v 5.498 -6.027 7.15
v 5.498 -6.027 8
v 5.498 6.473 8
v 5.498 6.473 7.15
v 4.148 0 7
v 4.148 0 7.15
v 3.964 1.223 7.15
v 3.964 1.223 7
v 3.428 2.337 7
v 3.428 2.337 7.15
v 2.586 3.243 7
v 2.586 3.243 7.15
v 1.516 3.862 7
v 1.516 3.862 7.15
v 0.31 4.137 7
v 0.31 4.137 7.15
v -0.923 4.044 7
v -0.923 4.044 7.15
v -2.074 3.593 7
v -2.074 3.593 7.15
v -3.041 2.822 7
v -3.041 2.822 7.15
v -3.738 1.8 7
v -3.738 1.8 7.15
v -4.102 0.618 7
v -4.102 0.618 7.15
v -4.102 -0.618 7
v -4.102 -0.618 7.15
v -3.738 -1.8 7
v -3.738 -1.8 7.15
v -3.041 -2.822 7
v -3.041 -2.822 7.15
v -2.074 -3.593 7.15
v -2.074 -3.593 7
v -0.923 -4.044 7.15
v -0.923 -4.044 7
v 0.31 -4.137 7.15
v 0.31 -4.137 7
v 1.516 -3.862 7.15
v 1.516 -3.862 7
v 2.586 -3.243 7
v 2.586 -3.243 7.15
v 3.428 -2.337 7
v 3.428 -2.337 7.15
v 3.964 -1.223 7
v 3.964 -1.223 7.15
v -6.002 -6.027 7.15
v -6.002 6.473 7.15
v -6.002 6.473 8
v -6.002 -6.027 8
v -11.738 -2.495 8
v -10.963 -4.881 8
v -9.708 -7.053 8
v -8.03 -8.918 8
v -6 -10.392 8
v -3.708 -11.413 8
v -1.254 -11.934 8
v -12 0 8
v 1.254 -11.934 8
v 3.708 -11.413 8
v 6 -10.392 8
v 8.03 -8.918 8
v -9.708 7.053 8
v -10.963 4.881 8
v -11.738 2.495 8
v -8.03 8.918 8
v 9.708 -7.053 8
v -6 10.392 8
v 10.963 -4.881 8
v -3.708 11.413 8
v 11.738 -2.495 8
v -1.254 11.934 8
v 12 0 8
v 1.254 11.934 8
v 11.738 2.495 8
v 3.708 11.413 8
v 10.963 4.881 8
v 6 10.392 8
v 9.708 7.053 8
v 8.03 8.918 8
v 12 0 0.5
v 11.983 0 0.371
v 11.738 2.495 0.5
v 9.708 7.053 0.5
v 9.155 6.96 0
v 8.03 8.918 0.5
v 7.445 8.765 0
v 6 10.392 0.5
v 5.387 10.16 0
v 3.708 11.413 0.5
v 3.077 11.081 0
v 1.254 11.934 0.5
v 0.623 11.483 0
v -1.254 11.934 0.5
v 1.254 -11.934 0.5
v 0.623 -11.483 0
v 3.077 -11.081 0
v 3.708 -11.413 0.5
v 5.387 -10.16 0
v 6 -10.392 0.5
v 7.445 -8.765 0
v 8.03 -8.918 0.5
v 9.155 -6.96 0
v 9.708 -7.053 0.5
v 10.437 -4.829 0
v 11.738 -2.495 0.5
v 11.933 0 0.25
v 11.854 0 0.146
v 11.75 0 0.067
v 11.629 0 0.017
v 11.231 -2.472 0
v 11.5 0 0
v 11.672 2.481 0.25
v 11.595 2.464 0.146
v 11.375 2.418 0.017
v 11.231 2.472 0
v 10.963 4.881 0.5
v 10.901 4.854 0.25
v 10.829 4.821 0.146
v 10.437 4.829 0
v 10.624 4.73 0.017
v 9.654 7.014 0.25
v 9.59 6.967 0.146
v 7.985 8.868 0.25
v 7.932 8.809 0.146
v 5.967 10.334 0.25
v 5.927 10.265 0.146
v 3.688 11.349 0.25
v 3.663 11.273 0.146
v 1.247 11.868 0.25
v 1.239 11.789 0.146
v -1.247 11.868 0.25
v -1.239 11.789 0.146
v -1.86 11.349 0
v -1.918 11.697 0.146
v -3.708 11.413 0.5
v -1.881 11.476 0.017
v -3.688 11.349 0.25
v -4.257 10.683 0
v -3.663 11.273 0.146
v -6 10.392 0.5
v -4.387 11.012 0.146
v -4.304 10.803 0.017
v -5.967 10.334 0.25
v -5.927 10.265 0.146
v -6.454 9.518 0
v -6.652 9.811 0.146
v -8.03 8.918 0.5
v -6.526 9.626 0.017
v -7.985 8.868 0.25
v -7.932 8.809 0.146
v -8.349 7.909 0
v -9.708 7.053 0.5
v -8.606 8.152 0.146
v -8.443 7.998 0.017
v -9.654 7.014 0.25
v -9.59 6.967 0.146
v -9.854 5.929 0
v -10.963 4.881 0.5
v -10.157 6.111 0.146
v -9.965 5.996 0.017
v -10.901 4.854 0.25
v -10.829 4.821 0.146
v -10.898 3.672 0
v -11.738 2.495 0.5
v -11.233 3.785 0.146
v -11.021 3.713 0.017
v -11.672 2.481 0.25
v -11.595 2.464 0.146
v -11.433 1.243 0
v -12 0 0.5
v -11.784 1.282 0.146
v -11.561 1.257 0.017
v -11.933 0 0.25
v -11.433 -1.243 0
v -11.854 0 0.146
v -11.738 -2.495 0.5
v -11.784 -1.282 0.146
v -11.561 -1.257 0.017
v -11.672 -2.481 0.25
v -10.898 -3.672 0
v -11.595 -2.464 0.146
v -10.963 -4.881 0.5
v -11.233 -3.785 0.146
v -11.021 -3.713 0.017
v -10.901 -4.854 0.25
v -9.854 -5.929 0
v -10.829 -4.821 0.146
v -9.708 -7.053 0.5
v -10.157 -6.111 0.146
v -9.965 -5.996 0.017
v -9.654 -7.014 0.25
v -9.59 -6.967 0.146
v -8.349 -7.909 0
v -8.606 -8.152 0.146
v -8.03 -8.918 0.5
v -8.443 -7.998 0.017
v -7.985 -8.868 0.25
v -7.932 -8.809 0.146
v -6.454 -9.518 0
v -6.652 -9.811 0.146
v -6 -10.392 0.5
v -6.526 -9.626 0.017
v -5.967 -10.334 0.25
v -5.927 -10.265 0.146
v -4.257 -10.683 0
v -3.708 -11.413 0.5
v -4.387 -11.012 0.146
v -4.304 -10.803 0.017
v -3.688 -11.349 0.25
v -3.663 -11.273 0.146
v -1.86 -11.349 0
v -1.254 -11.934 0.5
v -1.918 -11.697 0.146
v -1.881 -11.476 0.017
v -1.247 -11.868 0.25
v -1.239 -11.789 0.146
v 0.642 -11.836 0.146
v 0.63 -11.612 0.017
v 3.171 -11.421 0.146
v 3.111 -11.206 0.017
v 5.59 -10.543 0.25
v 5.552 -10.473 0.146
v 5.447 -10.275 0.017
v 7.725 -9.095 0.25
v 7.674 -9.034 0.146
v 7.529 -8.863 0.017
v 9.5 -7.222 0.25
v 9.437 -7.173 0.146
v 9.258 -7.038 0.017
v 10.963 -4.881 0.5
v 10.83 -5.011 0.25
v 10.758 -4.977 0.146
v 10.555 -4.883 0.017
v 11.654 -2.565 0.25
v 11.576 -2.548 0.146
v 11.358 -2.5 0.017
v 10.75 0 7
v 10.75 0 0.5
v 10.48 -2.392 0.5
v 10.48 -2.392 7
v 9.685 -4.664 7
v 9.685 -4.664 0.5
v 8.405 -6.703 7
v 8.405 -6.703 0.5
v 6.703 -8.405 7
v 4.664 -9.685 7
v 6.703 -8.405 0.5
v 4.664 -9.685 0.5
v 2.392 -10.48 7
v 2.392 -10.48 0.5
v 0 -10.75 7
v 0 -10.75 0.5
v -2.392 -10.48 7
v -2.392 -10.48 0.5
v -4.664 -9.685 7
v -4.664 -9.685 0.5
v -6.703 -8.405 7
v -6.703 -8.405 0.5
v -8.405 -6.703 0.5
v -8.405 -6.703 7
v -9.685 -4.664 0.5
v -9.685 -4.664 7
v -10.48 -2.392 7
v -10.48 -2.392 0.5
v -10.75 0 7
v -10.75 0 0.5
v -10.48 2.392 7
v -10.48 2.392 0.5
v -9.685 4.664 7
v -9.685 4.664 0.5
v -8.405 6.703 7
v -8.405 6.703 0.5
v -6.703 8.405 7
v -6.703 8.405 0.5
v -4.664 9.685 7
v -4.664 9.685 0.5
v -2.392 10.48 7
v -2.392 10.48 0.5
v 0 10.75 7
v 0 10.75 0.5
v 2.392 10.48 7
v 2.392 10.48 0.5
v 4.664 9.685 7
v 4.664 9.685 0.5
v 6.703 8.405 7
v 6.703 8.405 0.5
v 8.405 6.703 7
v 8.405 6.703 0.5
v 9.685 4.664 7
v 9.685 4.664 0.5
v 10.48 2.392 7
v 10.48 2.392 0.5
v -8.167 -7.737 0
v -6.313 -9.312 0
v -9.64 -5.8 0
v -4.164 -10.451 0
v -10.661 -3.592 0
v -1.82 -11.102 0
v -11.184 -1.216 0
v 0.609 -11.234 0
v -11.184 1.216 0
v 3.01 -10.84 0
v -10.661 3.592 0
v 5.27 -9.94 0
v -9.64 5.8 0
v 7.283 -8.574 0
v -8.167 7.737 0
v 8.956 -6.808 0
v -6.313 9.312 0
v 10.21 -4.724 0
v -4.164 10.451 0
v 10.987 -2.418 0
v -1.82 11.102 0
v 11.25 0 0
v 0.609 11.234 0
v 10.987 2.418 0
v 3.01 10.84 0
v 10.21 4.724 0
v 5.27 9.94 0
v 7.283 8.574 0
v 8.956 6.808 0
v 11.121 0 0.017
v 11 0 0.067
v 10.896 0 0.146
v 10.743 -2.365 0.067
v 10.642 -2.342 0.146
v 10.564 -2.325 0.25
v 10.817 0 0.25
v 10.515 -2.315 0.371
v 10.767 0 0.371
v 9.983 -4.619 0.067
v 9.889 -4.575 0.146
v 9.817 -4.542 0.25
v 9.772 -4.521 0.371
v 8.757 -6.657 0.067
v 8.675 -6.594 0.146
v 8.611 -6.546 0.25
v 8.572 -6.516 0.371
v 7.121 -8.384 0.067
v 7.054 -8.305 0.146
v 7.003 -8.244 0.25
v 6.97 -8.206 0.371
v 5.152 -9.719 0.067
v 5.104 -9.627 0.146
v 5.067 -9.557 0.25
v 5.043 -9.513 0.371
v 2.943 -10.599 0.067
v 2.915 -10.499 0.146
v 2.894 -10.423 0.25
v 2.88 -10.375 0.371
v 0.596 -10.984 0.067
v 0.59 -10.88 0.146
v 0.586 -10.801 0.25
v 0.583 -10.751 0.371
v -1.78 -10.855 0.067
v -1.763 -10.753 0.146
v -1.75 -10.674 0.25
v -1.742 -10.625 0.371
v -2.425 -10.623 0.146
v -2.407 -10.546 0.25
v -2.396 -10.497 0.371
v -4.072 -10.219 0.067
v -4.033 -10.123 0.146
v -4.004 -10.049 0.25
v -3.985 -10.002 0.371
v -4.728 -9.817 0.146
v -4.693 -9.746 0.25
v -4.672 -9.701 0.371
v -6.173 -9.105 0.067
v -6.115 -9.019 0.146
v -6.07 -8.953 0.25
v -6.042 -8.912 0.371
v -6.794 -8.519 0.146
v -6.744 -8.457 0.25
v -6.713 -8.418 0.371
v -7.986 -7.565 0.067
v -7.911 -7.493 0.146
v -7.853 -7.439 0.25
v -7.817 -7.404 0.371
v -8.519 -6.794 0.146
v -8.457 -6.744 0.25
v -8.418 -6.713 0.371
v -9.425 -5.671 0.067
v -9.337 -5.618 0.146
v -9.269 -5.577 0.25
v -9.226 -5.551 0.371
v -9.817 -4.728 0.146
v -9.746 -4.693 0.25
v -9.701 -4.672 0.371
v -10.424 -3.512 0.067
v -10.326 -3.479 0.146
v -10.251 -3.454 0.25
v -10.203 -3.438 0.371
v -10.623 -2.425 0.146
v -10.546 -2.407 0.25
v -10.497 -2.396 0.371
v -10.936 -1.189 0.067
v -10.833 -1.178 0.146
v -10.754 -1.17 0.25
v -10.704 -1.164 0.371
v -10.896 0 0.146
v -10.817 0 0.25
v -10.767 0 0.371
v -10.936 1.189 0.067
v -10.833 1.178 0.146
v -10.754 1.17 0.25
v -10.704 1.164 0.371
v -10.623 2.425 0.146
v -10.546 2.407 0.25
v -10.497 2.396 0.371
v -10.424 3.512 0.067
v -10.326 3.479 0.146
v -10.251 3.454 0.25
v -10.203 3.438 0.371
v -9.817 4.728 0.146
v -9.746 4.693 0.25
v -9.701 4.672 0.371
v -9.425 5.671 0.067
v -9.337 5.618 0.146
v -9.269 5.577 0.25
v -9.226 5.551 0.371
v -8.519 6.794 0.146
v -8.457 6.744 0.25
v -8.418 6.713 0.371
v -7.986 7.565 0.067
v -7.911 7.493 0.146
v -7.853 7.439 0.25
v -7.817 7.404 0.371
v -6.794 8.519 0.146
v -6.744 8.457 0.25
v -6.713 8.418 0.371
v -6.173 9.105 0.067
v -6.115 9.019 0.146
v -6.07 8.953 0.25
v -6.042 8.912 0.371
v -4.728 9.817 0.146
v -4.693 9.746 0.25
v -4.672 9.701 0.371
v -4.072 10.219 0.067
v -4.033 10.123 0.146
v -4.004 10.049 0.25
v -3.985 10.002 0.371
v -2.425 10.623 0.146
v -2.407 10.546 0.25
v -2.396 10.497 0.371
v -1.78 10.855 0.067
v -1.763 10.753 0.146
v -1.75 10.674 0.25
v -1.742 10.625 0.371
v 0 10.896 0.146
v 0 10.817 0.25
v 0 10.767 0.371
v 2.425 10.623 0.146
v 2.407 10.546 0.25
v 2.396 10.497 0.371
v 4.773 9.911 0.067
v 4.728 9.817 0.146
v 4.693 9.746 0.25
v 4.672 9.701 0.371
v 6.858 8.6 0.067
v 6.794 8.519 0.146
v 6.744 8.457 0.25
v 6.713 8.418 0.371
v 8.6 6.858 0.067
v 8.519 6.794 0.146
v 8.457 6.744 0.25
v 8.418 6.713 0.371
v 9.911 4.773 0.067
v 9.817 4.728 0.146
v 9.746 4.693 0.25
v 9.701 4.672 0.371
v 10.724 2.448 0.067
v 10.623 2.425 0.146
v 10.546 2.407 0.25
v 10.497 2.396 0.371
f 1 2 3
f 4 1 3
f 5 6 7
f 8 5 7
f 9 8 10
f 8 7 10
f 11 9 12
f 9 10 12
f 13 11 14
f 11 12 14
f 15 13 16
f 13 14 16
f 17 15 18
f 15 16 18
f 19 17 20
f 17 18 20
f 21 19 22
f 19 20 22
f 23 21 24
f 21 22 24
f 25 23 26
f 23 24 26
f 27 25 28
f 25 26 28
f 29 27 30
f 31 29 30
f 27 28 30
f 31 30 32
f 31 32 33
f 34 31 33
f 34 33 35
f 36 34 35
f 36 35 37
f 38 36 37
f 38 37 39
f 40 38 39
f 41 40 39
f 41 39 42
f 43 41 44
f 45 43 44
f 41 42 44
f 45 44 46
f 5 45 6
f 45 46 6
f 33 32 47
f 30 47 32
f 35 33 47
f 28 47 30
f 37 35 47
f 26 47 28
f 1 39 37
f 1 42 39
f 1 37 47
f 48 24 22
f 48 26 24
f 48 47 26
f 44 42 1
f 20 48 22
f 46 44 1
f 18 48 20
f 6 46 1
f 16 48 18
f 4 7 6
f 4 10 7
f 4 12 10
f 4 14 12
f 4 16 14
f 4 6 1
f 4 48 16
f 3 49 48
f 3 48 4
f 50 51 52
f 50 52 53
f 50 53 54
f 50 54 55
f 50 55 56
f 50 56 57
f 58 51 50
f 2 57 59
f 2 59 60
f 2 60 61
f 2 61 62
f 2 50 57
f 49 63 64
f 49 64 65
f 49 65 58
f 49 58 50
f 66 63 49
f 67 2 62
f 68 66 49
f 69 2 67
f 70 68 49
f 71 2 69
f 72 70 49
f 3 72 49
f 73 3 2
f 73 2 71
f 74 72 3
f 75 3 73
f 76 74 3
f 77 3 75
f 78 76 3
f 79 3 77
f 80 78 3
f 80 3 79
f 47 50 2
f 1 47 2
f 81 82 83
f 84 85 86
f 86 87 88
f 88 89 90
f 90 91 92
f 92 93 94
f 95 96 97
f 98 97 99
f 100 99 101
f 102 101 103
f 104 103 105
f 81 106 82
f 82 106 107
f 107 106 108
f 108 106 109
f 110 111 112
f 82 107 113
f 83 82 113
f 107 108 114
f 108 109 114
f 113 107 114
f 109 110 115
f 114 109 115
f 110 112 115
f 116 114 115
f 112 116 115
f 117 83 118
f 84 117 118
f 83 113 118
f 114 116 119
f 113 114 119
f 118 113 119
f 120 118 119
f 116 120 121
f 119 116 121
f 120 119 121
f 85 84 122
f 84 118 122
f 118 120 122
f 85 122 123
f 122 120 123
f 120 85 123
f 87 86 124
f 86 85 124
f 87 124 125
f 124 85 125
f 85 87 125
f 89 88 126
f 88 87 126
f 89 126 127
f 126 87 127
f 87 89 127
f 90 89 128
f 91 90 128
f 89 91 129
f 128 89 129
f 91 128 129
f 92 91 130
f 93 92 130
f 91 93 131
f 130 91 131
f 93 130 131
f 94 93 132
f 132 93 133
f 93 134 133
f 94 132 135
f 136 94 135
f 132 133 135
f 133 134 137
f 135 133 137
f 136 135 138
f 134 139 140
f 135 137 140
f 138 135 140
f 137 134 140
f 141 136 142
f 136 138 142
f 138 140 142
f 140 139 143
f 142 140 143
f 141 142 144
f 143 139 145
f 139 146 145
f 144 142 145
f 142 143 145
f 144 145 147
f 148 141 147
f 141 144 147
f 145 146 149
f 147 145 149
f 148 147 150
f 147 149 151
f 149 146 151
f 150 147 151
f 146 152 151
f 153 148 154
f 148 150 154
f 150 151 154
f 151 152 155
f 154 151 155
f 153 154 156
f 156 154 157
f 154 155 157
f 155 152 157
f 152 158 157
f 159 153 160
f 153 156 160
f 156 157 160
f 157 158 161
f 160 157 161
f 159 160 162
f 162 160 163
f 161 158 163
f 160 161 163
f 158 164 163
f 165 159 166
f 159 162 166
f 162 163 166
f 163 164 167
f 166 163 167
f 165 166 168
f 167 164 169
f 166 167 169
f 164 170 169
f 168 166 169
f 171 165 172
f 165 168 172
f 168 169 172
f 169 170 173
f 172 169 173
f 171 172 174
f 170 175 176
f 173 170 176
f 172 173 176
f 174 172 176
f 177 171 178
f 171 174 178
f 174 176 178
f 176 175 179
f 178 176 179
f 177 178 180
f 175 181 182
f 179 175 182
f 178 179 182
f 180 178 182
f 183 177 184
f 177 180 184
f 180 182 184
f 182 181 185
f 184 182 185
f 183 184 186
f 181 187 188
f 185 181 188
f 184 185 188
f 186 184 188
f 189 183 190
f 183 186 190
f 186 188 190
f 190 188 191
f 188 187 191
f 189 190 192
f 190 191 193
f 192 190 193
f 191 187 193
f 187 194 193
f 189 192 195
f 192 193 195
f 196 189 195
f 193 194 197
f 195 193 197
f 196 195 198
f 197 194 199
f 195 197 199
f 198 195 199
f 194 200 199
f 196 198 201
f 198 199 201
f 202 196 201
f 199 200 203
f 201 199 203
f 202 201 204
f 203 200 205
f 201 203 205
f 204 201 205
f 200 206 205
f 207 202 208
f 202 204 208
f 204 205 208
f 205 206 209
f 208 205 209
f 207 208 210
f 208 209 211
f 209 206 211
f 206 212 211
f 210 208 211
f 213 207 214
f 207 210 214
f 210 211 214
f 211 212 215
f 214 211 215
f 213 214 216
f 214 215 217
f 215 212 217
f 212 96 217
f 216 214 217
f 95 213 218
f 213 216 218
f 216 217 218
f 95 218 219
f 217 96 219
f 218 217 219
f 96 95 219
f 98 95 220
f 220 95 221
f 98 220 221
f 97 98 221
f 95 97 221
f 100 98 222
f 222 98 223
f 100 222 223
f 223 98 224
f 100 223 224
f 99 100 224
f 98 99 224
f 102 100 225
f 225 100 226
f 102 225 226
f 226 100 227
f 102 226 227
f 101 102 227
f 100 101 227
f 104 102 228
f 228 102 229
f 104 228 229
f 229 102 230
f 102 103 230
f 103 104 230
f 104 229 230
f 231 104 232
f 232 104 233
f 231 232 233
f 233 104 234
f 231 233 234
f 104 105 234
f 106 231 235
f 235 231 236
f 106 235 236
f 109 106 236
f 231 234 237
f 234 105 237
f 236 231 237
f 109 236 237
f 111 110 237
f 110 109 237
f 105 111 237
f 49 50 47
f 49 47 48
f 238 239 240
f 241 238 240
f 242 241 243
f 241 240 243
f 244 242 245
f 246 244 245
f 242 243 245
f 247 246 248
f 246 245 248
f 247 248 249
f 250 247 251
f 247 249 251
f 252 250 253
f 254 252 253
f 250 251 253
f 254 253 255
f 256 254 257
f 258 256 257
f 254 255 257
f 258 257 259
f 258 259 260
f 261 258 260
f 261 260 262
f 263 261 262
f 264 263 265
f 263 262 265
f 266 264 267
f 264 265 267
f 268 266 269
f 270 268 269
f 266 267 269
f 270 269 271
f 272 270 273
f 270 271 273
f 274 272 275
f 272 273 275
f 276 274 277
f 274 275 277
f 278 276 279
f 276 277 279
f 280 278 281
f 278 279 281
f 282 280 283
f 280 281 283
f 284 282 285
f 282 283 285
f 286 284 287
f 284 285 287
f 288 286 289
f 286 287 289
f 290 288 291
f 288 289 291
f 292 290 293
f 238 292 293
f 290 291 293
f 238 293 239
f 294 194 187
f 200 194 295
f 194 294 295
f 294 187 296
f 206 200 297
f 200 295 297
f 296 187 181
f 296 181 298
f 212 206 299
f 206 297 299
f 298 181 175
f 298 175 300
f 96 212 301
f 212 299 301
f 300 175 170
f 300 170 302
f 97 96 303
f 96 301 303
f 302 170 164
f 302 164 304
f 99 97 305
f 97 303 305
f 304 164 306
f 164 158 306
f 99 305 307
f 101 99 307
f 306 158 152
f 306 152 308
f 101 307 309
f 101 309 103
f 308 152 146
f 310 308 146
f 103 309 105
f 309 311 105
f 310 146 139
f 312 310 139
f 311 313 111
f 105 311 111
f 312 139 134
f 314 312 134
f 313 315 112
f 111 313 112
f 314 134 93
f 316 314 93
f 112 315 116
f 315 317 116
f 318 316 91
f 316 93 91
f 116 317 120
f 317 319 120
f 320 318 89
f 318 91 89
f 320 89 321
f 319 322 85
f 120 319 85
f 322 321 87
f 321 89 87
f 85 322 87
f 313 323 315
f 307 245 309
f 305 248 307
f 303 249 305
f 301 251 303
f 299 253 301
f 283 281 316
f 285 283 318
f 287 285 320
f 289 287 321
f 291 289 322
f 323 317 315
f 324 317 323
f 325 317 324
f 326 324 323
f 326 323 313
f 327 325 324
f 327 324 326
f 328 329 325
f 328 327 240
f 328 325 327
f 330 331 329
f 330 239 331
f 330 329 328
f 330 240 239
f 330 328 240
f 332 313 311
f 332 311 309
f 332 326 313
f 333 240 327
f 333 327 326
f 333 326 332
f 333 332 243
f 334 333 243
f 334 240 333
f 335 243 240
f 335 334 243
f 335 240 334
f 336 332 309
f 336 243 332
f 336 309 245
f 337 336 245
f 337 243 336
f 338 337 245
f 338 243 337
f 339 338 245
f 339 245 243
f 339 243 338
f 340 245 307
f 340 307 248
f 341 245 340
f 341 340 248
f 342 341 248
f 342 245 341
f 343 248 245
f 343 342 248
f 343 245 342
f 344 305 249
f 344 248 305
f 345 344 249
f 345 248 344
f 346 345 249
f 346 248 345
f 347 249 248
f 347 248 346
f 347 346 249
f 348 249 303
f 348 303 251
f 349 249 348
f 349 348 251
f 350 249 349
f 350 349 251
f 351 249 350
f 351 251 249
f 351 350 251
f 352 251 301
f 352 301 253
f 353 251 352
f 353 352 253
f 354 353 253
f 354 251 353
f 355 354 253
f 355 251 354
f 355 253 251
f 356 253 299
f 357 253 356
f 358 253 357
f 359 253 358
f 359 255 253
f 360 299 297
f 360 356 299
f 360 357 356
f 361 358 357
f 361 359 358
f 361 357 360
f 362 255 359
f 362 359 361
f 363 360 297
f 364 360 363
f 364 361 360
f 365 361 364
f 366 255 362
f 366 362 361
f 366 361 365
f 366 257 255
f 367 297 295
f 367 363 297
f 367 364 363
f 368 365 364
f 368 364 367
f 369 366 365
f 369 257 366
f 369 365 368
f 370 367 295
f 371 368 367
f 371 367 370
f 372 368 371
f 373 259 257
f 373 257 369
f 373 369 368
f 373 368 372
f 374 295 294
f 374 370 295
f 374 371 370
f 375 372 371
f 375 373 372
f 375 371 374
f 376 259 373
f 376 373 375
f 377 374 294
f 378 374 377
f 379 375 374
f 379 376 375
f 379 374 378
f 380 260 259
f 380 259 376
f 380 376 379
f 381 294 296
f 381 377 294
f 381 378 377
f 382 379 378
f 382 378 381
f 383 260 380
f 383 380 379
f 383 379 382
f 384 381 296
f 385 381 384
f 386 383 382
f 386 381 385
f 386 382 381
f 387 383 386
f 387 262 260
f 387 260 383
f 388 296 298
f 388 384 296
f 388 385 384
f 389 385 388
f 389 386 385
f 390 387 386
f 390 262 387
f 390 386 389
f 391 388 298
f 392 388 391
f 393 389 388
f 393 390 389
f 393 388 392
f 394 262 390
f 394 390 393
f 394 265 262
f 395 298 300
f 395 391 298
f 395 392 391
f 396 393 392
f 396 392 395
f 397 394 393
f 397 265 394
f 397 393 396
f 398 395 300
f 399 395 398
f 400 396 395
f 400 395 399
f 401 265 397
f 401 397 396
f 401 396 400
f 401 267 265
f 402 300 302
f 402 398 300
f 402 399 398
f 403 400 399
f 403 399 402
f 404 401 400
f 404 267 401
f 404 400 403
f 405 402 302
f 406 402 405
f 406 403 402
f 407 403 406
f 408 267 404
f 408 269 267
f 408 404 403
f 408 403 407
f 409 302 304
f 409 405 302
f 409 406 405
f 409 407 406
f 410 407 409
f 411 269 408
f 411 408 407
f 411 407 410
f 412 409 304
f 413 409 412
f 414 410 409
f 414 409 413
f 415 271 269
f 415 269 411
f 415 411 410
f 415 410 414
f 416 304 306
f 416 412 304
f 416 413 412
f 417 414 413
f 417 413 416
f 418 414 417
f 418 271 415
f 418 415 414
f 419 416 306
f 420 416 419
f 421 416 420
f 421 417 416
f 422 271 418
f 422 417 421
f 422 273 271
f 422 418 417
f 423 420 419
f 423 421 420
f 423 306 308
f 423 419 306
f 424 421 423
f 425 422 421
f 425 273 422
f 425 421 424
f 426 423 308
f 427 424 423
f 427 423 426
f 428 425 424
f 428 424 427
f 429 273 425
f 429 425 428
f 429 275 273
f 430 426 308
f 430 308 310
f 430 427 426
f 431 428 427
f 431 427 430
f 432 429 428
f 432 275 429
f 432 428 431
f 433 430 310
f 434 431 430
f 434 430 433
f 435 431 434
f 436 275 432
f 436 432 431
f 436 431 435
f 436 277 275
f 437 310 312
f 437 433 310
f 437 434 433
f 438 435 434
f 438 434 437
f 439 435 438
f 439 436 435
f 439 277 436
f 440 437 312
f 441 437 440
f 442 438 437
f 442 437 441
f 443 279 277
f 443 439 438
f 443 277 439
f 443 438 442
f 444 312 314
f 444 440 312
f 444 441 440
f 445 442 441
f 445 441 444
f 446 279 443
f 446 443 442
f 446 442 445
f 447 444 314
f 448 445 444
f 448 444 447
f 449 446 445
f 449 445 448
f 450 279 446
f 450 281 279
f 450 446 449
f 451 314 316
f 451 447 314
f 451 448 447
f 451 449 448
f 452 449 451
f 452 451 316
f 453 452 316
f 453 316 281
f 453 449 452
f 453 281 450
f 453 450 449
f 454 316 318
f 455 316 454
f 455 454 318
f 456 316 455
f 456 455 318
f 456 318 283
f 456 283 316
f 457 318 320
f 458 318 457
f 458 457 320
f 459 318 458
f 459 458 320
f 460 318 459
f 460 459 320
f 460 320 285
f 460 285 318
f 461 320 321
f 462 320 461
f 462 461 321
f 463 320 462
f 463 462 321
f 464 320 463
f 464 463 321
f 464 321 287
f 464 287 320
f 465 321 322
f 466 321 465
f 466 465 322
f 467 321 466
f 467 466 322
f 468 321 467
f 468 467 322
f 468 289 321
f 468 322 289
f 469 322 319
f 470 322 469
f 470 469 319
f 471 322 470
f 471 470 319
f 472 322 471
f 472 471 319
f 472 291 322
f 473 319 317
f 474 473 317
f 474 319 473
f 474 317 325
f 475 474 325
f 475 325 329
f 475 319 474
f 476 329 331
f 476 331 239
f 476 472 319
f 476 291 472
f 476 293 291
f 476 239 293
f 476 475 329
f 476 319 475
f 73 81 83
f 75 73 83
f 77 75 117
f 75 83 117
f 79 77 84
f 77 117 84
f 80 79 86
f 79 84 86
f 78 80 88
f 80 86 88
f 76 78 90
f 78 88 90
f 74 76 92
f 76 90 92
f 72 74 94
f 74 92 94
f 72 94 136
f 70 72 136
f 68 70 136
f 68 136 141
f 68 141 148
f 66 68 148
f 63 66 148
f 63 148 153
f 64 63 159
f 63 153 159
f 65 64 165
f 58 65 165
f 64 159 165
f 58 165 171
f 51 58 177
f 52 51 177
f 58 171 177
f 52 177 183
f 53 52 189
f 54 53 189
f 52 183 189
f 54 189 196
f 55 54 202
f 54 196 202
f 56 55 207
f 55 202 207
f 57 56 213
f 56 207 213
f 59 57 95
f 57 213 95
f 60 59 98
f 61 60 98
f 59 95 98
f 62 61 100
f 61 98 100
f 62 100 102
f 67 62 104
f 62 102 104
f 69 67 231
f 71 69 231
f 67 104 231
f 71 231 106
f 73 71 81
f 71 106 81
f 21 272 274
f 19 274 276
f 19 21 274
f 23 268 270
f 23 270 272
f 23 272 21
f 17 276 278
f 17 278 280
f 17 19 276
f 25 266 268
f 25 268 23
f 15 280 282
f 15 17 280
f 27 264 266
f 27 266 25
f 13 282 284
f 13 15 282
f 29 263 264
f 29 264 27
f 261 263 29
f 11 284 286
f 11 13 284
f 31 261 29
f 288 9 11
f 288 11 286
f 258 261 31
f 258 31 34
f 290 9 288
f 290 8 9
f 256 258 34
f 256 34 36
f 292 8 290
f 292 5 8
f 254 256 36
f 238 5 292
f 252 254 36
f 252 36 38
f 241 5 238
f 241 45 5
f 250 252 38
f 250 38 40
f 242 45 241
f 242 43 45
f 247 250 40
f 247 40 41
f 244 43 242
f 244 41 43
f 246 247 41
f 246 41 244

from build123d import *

# Parameters (mm, degrees)
F0_R     = 12
F1_DEPTH = 8
F2_R     = 10.75
F3_DEPTH = 7
F4_W     = 11.5
F4_H     = 12.5
F5_DEPTH = 0.85
F6_R     = 4.148405
F7_DEPTH = 0.15
F8_R     = 0.5


with BuildPart() as f1:
    # F0 (on Top) → F1 (new body)
    with BuildSketch(Plane.XY):
        Circle(F0_R)
    extrude(amount=F1_DEPTH)

    # F2 (on face) → F3 (cut)
    with BuildSketch(Plane(origin=(0, 0, 0), x_dir=(1, 0, 0), z_dir=(0, 0, -1))):
        Circle(F2_R)
    extrude(amount=-F3_DEPTH, mode=Mode.SUBTRACT)

    # F4 (on face) → F5 (cut)
    with BuildSketch(Plane.XY.offset(8)):
        with Locations((-0.252232, 0.222986)):
            Rectangle(F4_W, F4_H)
    extrude(amount=-F5_DEPTH, mode=Mode.SUBTRACT)

    # F6 (on face) → F7 (cut)
    with BuildSketch(Plane.XY.offset(7.15)):
        Circle(F6_R)
    extrude(amount=-F7_DEPTH, mode=Mode.SUBTRACT)

    # F8
    f8_edges = [f1.edges().sort_by_distance(p)[0] for p in [
        (-12, 0, 0),
        (-10.75, 0, 0),
    ]]
    fillet(f8_edges, radius=F8_R)


solid = f1.part
